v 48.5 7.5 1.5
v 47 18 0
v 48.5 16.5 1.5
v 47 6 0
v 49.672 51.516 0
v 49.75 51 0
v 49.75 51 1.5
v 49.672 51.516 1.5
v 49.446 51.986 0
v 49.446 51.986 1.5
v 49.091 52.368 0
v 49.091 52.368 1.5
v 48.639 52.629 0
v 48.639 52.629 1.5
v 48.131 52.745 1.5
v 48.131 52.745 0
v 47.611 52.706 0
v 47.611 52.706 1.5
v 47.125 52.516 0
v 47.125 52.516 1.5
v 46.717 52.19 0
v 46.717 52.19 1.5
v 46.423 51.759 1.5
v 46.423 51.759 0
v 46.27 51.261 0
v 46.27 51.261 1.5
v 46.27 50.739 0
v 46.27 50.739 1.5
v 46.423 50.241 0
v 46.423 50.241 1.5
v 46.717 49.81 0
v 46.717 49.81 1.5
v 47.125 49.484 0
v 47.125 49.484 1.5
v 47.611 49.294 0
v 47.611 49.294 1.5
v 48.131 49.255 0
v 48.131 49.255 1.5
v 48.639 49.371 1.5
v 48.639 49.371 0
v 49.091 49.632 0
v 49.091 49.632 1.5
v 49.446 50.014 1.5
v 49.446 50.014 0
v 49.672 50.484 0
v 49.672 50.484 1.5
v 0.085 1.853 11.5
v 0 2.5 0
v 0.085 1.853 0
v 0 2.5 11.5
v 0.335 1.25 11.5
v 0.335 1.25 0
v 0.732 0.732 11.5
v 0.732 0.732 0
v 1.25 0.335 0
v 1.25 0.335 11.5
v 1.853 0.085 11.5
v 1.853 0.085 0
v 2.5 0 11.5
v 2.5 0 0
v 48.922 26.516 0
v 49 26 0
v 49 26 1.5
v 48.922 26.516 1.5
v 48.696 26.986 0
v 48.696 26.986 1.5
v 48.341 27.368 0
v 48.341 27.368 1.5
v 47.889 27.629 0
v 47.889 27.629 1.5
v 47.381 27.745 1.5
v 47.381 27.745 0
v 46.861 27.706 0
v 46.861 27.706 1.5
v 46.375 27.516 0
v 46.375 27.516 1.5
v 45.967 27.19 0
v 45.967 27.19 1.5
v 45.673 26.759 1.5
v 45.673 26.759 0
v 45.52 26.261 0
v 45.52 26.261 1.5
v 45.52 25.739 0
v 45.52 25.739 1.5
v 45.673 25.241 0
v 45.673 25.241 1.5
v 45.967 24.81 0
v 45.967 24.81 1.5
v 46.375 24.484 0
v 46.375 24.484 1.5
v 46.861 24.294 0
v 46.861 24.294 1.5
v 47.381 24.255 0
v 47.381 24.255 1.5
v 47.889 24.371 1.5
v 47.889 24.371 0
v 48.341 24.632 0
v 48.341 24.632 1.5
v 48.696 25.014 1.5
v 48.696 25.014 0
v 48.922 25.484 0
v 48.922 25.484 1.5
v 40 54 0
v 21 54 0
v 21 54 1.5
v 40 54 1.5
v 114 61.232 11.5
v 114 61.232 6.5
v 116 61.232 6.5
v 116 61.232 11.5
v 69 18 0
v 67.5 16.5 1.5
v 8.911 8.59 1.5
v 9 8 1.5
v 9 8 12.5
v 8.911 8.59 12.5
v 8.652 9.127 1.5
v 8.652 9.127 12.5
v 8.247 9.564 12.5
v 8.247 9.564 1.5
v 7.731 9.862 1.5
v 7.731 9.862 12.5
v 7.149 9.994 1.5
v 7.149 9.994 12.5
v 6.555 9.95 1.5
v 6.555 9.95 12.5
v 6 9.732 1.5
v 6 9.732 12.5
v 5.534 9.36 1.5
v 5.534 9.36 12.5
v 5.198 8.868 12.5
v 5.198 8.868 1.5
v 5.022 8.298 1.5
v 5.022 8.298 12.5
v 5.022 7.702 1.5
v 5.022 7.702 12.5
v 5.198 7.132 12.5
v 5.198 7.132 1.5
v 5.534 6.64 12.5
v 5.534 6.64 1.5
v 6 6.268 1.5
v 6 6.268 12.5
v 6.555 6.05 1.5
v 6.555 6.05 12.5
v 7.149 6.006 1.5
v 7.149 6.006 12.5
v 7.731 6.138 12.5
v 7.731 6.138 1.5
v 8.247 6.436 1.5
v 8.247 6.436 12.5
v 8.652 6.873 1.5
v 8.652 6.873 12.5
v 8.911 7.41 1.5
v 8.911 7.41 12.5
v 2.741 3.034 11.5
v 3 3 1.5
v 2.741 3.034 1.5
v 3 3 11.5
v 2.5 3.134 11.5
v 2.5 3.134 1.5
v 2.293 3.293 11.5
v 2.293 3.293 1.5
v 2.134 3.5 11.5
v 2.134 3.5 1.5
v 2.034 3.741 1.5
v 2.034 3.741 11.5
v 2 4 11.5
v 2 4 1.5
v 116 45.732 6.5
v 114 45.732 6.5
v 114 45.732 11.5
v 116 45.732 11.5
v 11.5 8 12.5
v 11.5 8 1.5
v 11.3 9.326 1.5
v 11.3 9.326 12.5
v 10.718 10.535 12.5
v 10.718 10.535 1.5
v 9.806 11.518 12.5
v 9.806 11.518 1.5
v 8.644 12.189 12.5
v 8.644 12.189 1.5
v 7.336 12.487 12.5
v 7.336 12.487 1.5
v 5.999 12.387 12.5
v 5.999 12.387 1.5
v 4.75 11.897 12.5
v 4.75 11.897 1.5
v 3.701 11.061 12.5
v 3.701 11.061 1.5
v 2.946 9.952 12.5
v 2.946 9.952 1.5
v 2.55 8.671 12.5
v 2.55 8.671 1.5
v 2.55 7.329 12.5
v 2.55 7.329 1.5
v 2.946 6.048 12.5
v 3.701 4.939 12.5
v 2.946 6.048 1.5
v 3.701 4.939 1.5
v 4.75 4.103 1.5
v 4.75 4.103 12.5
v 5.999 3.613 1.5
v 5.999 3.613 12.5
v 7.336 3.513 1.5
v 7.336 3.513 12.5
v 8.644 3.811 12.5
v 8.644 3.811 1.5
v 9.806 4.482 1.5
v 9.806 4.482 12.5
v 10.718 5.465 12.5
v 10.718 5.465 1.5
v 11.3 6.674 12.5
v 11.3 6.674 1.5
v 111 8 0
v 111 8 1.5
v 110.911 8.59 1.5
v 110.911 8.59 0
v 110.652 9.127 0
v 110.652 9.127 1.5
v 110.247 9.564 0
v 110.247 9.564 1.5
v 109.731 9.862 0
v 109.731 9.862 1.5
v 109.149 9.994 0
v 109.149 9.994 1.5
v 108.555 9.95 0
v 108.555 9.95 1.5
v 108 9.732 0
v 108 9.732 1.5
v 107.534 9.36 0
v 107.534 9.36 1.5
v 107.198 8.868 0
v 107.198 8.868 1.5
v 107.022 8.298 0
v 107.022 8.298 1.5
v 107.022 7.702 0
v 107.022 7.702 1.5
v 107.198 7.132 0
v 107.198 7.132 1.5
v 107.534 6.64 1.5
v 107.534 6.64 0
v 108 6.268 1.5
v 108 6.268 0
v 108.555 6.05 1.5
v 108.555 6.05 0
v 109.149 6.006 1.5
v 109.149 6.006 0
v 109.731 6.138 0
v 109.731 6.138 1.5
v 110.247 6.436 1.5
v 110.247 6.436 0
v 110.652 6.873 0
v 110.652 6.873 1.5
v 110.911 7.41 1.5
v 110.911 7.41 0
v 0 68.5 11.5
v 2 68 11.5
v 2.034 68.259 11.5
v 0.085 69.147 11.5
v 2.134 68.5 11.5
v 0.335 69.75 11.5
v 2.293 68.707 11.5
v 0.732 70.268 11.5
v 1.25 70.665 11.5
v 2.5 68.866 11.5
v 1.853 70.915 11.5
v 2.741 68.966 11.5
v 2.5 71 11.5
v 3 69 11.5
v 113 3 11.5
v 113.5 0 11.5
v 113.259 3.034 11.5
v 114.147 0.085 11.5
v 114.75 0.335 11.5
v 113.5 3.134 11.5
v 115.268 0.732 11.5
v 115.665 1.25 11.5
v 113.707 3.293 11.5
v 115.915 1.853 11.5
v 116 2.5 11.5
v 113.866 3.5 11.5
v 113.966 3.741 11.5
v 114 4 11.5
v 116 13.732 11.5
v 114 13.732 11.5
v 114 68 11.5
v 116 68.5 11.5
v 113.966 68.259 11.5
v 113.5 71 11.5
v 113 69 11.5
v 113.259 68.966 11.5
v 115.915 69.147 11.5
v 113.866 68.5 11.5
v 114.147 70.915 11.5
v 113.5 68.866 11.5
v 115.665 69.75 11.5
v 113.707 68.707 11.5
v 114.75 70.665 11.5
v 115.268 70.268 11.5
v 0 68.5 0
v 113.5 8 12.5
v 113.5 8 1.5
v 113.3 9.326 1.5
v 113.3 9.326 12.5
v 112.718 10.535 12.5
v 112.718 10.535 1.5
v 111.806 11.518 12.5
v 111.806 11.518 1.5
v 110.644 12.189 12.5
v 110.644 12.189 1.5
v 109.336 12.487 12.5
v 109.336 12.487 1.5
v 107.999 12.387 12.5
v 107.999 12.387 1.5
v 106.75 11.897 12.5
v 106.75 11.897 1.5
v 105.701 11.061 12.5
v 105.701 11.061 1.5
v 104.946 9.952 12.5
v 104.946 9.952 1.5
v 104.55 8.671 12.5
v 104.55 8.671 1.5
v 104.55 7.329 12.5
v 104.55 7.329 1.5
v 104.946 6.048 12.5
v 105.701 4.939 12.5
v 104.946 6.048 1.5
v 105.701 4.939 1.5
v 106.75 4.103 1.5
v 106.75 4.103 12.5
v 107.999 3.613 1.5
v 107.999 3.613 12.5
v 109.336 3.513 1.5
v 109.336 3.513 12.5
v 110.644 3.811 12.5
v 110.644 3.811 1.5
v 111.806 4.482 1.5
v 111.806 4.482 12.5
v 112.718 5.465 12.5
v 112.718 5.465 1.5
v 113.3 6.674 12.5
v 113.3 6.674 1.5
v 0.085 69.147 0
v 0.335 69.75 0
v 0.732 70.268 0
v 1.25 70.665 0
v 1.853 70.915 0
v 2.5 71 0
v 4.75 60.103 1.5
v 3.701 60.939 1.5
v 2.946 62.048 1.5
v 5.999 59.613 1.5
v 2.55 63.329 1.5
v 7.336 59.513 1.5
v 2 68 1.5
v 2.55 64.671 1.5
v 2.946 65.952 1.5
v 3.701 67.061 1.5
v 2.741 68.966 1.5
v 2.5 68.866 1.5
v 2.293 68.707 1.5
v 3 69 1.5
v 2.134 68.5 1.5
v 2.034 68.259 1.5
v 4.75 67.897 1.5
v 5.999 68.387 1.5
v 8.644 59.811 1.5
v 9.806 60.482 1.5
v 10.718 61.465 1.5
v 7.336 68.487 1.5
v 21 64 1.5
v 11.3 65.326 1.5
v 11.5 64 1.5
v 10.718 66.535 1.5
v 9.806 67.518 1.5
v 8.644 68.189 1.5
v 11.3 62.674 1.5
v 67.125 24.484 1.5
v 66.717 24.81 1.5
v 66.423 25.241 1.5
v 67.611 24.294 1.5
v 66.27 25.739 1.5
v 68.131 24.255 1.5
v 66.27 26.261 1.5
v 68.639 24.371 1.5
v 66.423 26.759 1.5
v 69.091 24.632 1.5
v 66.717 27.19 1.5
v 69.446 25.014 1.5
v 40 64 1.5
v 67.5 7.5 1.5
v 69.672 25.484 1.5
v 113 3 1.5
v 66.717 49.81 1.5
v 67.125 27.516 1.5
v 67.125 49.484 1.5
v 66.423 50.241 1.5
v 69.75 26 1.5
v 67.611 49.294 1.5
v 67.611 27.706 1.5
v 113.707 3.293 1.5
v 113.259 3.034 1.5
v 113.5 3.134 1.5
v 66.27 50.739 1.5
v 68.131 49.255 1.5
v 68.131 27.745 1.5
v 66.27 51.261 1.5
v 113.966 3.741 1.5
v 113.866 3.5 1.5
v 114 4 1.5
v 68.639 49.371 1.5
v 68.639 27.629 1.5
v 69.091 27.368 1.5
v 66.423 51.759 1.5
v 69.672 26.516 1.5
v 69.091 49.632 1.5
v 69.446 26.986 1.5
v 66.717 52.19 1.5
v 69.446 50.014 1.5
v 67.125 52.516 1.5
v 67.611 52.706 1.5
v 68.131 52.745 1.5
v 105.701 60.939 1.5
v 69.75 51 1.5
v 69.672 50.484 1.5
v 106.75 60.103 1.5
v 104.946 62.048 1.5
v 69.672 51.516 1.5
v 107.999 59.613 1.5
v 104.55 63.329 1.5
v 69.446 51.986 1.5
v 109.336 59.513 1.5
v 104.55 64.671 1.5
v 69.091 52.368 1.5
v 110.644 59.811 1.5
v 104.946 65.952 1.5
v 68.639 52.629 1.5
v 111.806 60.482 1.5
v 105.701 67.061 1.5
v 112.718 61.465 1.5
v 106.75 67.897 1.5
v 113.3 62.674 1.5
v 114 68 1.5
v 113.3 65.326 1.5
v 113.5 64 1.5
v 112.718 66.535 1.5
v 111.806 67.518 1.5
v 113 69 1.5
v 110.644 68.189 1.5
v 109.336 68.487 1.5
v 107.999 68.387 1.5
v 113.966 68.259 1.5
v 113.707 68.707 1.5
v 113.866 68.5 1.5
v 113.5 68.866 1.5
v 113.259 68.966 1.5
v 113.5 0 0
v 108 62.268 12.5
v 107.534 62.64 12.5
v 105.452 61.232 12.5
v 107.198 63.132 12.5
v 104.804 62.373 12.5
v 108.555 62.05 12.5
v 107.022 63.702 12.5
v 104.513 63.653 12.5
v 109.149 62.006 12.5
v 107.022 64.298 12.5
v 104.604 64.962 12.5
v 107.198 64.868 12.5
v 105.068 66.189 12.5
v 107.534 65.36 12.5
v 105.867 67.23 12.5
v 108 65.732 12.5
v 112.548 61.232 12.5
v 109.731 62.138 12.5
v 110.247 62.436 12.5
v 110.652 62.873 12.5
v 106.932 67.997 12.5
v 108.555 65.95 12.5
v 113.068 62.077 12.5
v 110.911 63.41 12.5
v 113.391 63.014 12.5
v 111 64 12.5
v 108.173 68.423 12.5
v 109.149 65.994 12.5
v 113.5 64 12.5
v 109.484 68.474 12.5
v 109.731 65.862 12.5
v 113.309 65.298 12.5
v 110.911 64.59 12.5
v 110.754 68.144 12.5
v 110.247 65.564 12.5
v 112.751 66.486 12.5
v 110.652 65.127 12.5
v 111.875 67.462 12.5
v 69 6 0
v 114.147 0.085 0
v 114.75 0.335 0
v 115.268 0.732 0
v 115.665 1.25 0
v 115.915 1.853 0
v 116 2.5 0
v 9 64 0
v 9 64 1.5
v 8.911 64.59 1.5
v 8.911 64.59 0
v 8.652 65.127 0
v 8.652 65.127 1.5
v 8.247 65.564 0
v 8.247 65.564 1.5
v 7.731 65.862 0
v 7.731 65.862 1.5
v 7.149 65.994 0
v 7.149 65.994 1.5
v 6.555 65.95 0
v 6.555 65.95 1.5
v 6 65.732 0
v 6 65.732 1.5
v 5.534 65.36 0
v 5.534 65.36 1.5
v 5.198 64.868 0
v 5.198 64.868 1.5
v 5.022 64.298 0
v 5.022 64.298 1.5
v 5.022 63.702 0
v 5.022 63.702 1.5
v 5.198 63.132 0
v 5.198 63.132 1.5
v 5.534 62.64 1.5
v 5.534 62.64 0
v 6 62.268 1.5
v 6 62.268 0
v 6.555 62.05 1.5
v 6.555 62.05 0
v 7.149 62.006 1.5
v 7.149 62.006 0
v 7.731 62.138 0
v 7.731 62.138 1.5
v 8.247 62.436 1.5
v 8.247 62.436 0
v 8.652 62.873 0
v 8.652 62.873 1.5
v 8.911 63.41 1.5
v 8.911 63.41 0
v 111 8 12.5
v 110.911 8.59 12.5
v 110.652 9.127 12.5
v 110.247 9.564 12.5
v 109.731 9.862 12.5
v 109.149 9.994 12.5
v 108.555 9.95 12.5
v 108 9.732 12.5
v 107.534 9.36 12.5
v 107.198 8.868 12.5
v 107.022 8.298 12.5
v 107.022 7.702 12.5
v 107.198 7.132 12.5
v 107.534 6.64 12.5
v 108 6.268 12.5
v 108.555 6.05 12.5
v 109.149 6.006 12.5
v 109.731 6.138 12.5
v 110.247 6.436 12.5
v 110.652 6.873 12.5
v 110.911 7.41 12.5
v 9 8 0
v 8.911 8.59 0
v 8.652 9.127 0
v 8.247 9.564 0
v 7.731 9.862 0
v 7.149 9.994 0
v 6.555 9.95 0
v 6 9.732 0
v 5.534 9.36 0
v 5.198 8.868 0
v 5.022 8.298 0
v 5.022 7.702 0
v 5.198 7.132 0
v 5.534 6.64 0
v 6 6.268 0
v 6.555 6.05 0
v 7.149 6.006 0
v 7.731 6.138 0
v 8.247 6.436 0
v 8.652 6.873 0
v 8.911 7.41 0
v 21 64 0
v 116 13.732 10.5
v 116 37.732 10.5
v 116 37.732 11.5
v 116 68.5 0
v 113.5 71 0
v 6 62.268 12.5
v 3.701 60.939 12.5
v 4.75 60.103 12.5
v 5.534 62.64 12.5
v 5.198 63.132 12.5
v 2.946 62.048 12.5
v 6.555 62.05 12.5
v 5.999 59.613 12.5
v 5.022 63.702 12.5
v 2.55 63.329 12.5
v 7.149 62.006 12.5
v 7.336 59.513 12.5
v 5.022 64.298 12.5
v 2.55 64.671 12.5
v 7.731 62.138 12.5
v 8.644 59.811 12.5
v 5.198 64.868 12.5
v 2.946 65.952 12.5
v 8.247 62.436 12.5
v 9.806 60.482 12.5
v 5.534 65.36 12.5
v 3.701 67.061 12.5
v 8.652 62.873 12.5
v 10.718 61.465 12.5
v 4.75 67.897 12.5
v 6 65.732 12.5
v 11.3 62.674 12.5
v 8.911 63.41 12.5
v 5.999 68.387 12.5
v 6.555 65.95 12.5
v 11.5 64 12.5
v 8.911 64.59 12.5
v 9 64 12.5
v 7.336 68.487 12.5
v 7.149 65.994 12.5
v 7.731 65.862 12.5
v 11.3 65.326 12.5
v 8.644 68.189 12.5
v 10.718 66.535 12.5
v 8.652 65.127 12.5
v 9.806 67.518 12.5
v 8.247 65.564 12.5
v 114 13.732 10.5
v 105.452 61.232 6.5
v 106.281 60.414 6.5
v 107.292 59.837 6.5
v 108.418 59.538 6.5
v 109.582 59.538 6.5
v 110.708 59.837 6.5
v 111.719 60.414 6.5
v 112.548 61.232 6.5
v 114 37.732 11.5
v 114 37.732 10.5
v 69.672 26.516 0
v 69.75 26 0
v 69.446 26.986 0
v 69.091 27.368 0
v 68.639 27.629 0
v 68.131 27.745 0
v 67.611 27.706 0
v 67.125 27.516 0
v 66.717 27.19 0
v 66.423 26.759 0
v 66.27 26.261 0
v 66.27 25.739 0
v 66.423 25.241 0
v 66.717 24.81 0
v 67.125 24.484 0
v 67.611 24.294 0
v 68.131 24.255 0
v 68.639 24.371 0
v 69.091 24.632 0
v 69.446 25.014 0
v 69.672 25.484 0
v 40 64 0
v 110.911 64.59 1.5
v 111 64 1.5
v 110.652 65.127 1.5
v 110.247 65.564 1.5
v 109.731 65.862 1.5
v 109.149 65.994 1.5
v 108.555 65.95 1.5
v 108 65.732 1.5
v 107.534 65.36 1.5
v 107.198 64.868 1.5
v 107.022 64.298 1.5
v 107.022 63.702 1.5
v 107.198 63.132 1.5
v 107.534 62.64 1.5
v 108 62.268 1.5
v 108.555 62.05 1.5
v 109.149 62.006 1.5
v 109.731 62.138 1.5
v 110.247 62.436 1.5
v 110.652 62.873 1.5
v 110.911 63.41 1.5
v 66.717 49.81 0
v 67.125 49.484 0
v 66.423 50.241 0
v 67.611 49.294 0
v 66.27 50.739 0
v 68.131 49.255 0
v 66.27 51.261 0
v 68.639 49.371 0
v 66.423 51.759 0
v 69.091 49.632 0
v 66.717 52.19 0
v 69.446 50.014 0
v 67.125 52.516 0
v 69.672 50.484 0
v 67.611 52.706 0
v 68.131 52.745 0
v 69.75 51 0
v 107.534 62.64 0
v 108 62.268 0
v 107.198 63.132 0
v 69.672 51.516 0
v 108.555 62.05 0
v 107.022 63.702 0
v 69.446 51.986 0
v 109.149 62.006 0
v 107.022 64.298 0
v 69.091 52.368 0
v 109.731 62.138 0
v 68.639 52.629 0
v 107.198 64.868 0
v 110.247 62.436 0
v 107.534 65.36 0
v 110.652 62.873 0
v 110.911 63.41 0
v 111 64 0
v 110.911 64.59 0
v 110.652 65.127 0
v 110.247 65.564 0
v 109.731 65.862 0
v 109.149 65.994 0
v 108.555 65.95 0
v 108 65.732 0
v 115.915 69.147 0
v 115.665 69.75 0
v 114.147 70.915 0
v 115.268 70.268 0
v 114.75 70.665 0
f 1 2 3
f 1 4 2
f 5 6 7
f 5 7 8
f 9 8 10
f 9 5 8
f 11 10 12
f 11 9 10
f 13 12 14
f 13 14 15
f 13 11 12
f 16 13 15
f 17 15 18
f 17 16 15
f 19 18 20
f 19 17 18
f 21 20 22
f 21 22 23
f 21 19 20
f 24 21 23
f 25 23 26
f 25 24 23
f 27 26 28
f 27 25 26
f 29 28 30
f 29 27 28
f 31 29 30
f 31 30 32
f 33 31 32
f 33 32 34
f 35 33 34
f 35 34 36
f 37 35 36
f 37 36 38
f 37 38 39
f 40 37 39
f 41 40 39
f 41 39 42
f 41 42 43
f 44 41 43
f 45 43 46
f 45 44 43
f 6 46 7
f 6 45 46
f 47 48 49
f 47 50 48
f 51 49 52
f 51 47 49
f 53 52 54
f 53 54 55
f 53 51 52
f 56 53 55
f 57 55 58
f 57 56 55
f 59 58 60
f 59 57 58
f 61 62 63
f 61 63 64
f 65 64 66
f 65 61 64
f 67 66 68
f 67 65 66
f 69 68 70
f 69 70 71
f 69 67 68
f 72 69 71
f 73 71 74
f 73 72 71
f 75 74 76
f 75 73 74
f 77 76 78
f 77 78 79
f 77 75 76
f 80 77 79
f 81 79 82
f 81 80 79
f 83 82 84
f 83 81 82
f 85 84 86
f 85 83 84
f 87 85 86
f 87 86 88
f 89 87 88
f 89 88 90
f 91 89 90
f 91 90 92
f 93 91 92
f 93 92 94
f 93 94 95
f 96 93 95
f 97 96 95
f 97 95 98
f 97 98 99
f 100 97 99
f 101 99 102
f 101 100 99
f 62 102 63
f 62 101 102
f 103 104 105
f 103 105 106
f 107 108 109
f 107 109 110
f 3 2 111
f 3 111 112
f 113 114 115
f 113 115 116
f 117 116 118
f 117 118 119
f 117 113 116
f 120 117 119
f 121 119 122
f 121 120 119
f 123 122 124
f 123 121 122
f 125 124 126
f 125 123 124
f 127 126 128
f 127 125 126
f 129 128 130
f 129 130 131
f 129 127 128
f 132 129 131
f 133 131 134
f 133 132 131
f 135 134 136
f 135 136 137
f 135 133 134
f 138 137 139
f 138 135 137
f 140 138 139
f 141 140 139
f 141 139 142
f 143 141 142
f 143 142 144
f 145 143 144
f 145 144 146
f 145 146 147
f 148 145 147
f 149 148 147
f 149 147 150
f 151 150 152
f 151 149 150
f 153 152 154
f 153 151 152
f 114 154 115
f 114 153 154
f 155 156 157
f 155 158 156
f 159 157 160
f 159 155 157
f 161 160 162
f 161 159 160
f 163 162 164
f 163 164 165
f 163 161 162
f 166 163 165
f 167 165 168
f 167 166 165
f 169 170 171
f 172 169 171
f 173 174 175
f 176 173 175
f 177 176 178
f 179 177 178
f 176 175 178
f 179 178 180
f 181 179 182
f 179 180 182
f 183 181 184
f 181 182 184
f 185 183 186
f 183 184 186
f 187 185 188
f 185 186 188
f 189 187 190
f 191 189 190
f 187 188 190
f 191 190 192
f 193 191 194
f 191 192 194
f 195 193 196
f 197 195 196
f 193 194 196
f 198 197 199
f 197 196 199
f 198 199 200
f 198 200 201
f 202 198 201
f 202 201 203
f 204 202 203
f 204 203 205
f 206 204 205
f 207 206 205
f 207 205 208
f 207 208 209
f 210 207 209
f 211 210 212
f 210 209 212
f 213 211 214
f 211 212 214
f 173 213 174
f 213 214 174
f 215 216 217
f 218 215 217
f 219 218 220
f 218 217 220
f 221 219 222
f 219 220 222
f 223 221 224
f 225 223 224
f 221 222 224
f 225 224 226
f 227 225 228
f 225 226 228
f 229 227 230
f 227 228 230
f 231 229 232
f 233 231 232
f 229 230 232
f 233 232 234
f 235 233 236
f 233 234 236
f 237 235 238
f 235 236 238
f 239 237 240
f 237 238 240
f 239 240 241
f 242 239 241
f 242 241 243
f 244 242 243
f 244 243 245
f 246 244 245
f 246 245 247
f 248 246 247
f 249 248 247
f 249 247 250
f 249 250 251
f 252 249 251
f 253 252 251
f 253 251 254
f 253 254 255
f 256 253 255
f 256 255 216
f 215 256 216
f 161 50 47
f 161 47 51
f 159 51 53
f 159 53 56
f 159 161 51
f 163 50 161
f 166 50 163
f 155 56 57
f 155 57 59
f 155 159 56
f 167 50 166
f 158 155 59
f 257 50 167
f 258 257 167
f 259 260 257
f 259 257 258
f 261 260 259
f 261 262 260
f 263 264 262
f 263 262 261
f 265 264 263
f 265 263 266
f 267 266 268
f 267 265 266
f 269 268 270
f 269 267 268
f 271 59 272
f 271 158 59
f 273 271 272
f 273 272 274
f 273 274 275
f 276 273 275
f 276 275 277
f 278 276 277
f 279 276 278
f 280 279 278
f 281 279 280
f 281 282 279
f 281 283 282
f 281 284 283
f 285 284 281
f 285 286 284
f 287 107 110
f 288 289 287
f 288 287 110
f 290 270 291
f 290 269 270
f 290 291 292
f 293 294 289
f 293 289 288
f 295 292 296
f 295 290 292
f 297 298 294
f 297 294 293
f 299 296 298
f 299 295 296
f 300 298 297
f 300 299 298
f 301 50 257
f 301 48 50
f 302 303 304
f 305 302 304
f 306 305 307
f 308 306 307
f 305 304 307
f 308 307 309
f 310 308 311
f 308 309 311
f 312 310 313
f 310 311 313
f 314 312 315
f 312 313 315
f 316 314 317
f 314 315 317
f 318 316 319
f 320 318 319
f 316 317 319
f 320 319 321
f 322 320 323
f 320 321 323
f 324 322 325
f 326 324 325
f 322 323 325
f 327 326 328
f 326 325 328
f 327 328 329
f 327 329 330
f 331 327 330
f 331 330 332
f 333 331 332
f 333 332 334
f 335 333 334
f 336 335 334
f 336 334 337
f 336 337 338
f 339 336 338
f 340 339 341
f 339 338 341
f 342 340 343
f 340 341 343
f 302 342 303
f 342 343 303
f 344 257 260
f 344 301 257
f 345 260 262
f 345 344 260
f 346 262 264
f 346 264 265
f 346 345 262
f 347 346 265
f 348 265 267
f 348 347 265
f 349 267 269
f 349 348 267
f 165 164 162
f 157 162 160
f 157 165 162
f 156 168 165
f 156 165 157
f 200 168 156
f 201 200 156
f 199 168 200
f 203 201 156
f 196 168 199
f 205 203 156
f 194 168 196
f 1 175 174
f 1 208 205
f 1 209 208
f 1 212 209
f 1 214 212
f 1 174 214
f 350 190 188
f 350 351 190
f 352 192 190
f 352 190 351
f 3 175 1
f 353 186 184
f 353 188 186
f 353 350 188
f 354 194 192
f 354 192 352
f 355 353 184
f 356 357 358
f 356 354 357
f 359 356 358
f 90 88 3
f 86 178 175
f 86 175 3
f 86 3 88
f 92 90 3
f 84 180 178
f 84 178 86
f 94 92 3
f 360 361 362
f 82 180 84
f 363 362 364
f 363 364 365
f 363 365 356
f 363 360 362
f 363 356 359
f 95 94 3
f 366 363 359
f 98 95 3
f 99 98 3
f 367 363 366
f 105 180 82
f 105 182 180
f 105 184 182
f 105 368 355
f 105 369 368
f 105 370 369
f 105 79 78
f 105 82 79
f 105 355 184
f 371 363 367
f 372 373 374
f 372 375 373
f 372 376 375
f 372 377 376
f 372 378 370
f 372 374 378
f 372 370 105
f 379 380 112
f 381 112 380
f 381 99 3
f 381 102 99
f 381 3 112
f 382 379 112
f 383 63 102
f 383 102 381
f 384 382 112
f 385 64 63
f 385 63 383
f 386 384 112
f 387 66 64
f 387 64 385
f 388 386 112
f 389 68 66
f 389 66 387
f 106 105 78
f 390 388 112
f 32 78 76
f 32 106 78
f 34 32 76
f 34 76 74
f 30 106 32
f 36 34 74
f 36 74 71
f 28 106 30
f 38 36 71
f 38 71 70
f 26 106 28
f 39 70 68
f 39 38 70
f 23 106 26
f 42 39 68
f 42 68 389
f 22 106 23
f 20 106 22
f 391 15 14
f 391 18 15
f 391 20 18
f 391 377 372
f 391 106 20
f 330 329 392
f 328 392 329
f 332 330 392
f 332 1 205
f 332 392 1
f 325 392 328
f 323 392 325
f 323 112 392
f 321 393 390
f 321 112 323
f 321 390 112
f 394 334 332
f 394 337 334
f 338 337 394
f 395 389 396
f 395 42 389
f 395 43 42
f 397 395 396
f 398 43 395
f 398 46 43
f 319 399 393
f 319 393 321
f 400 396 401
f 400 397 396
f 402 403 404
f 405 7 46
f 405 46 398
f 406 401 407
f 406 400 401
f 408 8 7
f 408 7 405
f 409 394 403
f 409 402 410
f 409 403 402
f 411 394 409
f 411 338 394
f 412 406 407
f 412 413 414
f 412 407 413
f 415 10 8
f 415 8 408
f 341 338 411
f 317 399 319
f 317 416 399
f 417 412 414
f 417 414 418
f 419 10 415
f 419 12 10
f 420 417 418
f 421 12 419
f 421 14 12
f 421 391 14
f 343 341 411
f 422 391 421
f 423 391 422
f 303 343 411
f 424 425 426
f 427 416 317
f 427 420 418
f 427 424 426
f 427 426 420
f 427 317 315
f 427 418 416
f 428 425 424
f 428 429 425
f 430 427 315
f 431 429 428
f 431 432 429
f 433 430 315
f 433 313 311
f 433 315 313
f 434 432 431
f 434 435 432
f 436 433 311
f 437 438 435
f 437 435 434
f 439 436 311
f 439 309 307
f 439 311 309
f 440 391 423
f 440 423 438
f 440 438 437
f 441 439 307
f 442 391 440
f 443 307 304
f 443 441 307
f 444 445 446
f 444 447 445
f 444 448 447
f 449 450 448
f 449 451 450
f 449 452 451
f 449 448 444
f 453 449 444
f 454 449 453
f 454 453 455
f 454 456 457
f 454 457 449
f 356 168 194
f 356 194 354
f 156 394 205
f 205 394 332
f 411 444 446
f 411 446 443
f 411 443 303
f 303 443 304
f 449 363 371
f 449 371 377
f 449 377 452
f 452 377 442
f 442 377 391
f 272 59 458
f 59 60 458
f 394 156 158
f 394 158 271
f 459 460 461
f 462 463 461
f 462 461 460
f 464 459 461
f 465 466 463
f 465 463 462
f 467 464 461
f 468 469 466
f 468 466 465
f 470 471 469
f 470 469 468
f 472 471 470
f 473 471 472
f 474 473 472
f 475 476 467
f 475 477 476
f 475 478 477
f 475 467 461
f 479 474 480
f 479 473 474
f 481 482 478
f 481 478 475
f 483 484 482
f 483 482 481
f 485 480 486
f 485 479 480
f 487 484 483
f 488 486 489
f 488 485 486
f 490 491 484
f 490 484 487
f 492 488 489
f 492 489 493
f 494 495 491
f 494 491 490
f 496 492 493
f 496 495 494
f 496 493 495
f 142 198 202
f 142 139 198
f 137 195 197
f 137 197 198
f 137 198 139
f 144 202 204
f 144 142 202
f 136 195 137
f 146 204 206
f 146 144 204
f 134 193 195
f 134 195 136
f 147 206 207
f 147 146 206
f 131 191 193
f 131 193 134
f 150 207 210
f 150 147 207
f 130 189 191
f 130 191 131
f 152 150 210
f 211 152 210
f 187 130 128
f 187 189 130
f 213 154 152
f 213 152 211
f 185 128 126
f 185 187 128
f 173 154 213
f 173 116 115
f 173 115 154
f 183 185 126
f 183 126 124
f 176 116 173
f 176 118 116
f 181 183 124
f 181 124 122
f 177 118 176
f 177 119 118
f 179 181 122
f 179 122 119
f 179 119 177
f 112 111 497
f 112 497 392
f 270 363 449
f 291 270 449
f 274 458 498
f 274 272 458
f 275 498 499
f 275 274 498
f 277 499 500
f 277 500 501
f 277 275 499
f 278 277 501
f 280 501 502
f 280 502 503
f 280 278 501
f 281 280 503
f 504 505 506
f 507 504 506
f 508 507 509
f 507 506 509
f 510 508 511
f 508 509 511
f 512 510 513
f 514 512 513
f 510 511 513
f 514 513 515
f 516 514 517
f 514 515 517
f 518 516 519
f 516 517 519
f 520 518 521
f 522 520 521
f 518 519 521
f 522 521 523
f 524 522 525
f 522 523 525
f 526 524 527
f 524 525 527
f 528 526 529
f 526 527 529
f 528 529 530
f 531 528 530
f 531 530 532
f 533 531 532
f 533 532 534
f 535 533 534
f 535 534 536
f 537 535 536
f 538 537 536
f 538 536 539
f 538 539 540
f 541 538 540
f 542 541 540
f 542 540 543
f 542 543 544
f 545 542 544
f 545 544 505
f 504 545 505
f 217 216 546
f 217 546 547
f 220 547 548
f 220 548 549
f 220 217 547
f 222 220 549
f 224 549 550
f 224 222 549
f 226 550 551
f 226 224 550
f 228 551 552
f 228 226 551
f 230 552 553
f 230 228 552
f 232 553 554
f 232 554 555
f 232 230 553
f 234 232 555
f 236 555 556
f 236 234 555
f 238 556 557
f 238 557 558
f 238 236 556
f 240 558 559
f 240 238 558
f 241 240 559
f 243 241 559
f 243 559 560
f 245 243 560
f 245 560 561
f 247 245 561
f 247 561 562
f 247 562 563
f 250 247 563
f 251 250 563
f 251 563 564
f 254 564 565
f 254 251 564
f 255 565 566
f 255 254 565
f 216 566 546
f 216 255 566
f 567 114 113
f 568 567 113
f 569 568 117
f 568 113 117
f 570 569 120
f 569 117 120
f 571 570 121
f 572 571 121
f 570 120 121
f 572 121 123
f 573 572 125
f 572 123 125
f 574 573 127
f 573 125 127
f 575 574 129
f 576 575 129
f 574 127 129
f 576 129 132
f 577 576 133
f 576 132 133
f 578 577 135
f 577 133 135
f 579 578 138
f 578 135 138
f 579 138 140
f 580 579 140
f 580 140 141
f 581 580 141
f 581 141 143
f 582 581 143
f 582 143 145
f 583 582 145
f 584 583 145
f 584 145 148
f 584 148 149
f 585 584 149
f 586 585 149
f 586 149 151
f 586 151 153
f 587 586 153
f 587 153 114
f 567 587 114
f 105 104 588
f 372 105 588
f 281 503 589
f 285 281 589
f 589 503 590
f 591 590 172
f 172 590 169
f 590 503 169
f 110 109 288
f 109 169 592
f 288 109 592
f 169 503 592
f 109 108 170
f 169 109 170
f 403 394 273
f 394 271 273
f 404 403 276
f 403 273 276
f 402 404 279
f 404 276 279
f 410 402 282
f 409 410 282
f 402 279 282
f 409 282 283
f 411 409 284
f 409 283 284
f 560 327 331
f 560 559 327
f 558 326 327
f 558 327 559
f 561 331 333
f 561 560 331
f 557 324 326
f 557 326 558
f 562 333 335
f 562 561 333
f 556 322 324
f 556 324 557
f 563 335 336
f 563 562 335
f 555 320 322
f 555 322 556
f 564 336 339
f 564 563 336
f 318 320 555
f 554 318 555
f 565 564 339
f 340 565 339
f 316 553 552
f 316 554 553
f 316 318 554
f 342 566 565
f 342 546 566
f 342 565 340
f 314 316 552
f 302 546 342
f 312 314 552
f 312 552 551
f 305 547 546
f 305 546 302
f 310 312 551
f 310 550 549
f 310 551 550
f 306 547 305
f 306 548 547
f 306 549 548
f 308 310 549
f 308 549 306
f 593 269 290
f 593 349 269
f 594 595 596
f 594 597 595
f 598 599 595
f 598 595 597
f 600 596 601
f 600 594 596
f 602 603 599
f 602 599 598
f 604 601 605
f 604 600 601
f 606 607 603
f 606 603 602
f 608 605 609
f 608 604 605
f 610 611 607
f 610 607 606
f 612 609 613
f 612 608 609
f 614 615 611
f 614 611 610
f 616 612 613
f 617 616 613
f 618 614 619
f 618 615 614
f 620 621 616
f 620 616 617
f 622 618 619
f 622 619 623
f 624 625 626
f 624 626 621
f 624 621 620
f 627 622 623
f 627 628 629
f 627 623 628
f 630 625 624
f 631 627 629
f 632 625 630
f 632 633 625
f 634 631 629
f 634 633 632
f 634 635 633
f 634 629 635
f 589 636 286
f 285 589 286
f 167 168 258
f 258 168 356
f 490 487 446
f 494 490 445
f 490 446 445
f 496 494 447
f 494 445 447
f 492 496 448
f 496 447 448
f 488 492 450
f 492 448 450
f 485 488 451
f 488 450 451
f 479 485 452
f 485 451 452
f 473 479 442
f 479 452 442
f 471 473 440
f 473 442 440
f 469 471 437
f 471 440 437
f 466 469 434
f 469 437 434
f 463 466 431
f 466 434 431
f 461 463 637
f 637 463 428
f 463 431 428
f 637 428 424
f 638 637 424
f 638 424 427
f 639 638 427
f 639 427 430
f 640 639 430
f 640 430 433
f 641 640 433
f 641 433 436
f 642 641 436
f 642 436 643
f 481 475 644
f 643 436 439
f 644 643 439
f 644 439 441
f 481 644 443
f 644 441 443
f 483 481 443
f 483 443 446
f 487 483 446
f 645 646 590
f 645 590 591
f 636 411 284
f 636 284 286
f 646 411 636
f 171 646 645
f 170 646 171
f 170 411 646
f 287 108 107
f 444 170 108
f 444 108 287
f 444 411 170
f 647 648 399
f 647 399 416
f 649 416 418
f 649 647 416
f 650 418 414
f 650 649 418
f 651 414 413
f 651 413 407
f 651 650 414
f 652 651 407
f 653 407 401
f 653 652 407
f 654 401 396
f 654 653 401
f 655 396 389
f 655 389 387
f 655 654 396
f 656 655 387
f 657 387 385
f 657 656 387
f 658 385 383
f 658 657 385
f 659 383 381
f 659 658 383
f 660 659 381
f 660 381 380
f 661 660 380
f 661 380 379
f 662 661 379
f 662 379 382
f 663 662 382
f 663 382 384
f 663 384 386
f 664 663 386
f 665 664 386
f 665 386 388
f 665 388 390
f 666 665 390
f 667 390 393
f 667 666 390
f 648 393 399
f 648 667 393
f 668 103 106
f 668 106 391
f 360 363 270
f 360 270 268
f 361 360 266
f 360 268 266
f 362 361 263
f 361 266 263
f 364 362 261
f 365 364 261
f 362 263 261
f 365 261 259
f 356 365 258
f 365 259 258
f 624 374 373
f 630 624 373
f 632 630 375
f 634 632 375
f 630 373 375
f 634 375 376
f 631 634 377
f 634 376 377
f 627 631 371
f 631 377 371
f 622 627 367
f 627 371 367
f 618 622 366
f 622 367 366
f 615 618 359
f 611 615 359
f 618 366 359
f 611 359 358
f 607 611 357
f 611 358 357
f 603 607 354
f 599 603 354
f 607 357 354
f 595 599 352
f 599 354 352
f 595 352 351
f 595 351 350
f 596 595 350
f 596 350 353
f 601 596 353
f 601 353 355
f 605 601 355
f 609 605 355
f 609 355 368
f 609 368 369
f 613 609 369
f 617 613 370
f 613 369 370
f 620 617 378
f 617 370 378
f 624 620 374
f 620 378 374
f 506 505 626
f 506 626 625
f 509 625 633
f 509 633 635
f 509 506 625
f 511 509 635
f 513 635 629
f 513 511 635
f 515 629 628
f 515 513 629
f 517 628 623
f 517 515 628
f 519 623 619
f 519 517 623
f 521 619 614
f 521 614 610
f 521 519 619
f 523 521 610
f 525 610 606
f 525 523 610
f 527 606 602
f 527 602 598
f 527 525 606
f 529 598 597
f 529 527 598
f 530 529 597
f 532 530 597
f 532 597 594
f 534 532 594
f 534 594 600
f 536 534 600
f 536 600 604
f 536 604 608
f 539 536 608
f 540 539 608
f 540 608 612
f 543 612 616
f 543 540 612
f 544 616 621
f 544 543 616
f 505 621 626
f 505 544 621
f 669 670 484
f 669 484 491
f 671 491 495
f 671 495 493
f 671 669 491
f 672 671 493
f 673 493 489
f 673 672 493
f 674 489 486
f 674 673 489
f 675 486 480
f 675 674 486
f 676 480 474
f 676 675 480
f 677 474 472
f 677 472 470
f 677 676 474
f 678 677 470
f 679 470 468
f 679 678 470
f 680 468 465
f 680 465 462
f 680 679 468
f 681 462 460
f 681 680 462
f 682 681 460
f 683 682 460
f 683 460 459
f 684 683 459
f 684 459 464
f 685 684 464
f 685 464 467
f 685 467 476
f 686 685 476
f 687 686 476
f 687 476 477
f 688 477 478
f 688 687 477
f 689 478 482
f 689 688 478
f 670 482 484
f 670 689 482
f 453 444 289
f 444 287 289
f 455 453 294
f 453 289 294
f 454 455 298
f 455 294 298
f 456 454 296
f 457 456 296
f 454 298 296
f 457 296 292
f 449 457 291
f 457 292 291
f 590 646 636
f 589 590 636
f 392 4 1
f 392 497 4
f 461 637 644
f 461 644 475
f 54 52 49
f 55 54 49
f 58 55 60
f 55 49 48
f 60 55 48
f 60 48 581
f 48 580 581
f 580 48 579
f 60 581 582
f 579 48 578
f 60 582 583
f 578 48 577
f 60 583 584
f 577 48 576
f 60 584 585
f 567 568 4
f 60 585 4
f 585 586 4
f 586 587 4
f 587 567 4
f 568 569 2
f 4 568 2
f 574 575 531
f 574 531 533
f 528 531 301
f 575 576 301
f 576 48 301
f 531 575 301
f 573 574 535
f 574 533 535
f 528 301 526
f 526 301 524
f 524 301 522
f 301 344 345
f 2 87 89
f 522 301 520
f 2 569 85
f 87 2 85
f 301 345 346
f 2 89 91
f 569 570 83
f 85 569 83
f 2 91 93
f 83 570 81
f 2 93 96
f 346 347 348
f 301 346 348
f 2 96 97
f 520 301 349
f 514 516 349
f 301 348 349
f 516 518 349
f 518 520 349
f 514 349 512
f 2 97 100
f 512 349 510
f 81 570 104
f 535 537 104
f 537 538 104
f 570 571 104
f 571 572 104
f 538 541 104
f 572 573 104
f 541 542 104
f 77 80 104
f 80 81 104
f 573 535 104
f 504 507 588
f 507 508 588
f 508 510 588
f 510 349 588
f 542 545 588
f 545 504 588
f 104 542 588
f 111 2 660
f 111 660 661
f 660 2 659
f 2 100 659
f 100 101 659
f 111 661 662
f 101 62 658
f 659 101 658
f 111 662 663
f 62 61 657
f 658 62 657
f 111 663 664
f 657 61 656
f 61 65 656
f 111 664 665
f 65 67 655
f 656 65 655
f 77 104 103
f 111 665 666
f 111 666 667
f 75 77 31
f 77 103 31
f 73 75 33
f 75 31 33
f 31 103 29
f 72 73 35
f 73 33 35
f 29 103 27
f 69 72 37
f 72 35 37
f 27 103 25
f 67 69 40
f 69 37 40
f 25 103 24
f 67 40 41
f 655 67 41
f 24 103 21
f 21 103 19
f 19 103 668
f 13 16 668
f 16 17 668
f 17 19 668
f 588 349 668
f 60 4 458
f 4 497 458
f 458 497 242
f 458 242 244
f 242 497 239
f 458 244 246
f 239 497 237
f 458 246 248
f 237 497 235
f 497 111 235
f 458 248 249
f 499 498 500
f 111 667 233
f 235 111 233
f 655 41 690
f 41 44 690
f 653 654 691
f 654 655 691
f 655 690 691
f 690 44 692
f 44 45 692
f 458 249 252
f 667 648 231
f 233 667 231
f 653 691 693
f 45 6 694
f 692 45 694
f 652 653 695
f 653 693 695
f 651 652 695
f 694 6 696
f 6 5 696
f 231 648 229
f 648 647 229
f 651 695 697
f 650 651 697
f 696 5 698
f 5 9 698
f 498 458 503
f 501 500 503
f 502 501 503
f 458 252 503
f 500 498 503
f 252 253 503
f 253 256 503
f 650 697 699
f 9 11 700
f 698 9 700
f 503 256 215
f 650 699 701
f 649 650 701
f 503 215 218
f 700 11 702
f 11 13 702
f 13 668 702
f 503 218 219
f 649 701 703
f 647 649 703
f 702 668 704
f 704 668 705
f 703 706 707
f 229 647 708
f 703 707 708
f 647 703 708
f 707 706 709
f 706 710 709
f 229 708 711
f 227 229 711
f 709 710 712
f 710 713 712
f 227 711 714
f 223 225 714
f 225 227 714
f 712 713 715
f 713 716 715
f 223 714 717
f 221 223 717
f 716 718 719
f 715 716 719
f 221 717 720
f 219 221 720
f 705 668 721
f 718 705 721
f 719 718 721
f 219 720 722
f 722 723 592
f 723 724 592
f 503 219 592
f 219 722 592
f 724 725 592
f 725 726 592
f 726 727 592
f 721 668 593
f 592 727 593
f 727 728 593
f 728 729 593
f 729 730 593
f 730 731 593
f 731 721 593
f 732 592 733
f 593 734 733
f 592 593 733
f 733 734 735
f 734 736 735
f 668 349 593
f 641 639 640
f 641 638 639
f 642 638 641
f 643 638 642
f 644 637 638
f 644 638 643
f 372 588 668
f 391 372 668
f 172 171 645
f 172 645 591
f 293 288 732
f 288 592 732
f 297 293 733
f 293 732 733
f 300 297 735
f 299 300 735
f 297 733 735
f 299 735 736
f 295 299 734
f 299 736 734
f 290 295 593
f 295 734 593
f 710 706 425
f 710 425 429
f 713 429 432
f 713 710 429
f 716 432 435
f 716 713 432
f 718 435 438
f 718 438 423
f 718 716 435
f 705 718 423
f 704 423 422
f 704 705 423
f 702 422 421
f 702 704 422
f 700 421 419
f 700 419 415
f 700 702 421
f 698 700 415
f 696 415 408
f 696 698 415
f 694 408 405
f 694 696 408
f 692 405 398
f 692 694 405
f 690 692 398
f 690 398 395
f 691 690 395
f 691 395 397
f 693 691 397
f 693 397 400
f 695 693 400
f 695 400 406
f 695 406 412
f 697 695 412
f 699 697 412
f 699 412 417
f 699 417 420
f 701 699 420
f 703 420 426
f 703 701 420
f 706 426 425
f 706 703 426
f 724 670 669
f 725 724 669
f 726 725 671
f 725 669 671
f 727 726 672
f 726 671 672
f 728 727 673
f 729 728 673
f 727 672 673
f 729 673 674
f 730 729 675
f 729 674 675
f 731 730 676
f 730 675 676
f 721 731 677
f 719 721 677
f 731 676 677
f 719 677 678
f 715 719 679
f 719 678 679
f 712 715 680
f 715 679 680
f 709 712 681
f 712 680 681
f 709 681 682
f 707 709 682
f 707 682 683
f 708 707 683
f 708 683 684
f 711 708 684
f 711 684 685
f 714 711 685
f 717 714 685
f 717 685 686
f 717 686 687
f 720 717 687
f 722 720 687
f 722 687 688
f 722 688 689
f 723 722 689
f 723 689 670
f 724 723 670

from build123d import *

# Parameters (mm, degrees)
F0_W         = 116
F0_H         = 71
F0_R         = 1.75
F0_W_2       = 18
F0_H_2       = 8
F0_W_3       = 19
F0_H_3       = 10
F1_DEPTH     = 1.5
F2_W         = 116
F2_H         = 71
F2_W_2       = 112
F2_H_2       = 66
F3_DEPTH     = 10
F4_R         = 2.5
F5_R         = 1
F6_R         = 4.5
F6_R_2       = 2
F7_DEPTH     = 11
F8_T1_DEPTH  = 8
F8_T3_DEPTH  = 18
F8_T9_DEPTH  = 23.1433659759
F8_T13_DEPTH = 13.1433659759
F8_T20_DEPTH = 23.1433659759
F8_T24_DEPTH = 13.1433659759
F8_T31_DEPTH = 23.1433659759
F8_T35_DEPTH = 13.1433659759
F8_T42_DEPTH = 13.1433659759
F8_T46_DEPTH = 23.1433659759
F9_W         = 15.5
F9_H         = 9
F9_W_2       = 24
F9_H_2       = 5
F10_DEPTH    = 25
F11_DEPTH    = 25
F12_DEPTH    = 25


# Not quite as in the source:
# - a fillet or chamfer that OpenCascade refuses, or shapes differently, is made with other operations: its cross-section is extruded or revolved along the edge and cut away or added


with BuildPart() as f1:
    # F0 (on Top) → F1 (new body)
    with BuildSketch(Plane.XY):
        with Locations((58, 35.5)):
            Rectangle(F0_W, F0_H)
        with Locations((47.25, 26)):
            Circle(F0_R, mode=Mode.SUBTRACT)
        with Locations((58, 12)):
            Rectangle(F0_W_2, F0_H_2, mode=Mode.SUBTRACT)
        with Locations((68, 26)):
            Circle(F0_R, mode=Mode.SUBTRACT)
        with Locations((48, 51)):
            Circle(F0_R, mode=Mode.SUBTRACT)
        with Locations((30.5, 59)):
            Rectangle(F0_W_3, F0_H_3, mode=Mode.SUBTRACT)
        with Locations((68, 51)):
            Circle(F0_R, mode=Mode.SUBTRACT)
    extrude(amount=F1_DEPTH)

    # F2 (on face) → F3 (join)
    with BuildSketch(Plane.XY.offset(1.5)):
        with Locations((58, 35.5)):
            Rectangle(F2_W, F2_H)
        with Locations((58, 36)):
            Rectangle(F2_W_2, F2_H_2, mode=Mode.SUBTRACT)
    extrude(amount=F3_DEPTH)

    # F4
    f4_edges = [f1.edges().sort_by_distance(p)[0] for p in [
        (0, 0, 5.75),
        (116, 0, 5.75),
        (0, 71, 5.75),
        (116, 71, 5.75),
    ]]
    fillet(f4_edges, radius=F4_R)

    # F5
    f5_edges = [f1.edges().sort_by_distance(p)[0] for p in [
        (114, 3, 6.5),
        (2, 3, 6.5),
        (2, 69, 6.5),
        (114, 69, 6.5),
    ]]
    fillet(f5_edges, radius=F5_R)

    # F6 (on face) → F7 (join)
    with BuildSketch(Plane.XY.offset(1.5)):
        with Locations((7, 64)):
            Circle(F6_R)
        with Locations((7, 64)):
            Circle(F6_R_2, mode=Mode.SUBTRACT)
        with Locations((7, 8)):
            Circle(F6_R)
        with Locations((7, 8)):
            Circle(F6_R_2, mode=Mode.SUBTRACT)
        with Locations((109, 8)):
            Circle(F6_R)
        with Locations((109, 8)):
            Circle(F6_R_2, mode=Mode.SUBTRACT)
        with Locations((109, 64)):
            Circle(F6_R)
        with Locations((109, 64)):
            Circle(F6_R_2, mode=Mode.SUBTRACT)
    extrude(amount=F7_DEPTH)

    # F8: chamfer of 2 on 4 edges, made by hand

    # F8_s2 → F8_t1 (cut)
    with BuildSketch(Plane.XZ.offset(-16)):
        Polygon((69, 0), (67, 2), (67, 0), align=None)
        Polygon((47, 0), (49, 2), (49, 0), align=None)
    extrude(amount=F8_T1_DEPTH, mode=Mode.SUBTRACT)

    # F8_s4 → F8_t3 (cut)
    with BuildSketch(Plane.YZ.offset(49)):
        Polygon((6, 0), (8, 2), (8, 0), align=None)
        Polygon((18, 0), (16, 2), (16, 0), align=None)
    extrude(amount=F8_T3_DEPTH, mode=Mode.SUBTRACT)


with BuildPart() as f8_tool7:
    # F8_s8 → F8_t9 (new body)
    with BuildSketch(Plane.YZ.offset(49)):
        Polygon((18, 0), (16, 2), (16, 0), align=None)
    extrude(amount=F8_T9_DEPTH)

    split(bisect_by=Plane.YZ.offset(67), keep=Keep.TOP)


with BuildPart() as f8_tool11:
    # F8_s12 → F8_t13 (new body)
    with BuildSketch(Plane.XZ.offset(-21.1433659759)):
        Polygon((69, 0), (67, 2), (67, 0), align=None)
    extrude(amount=F8_T13_DEPTH)

    split(bisect_by=Plane.XZ.offset(-16), keep=Keep.BOTTOM)


with BuildPart() as f8_tool7_1:
    add(f8_tool7.part)

    # F8_t15: intersect F8_tool11
    add(f8_tool11.part, mode=Mode.INTERSECT)


with BuildPart() as f1_1:
    add(f1.part)

    # F8_t5: cut F8_tool7
    add(f8_tool7_1.part, mode=Mode.SUBTRACT)


with BuildPart() as f8_tool18:
    # F8_s19 → F8_t20 (new body)
    with BuildSketch(Plane.YZ.offset(72.1433659759)):
        Polygon((6, 0), (8, 2), (8, 0), align=None)
    extrude(amount=-F8_T20_DEPTH)

    split(bisect_by=Plane.YZ.offset(67), keep=Keep.TOP)


with BuildPart() as f8_tool22:
    # F8_s23 → F8_t24 (new body)
    with BuildSketch(Plane.XZ.offset(-16)):
        Polygon((69, 0), (67, 2), (67, 0), align=None)
    extrude(amount=F8_T24_DEPTH)

    split(bisect_by=Plane.XZ.offset(-8), keep=Keep.TOP)


with BuildPart() as f8_tool18_1:
    add(f8_tool18.part)

    # F8_t26: intersect F8_tool22
    add(f8_tool22.part, mode=Mode.INTERSECT)


with BuildPart() as f1_2:
    add(f1_1.part)

    # F8_t16: cut F8_tool18
    add(f8_tool18_1.part, mode=Mode.SUBTRACT)


with BuildPart() as f8_tool29:
    # F8_s30 → F8_t31 (new body)
    with BuildSketch(Plane.YZ.offset(67)):
        Polygon((6, 0), (8, 2), (8, 0), align=None)
    extrude(amount=-F8_T31_DEPTH)

    split(bisect_by=Plane.YZ.offset(49), keep=Keep.BOTTOM)


with BuildPart() as f8_tool33:
    # F8_s34 → F8_t35 (new body)
    with BuildSketch(Plane.XZ.offset(-2.8566340241)):
        Polygon((47, 0), (49, 2), (49, 0), align=None)
    extrude(amount=-F8_T35_DEPTH)

    split(bisect_by=Plane.XZ.offset(-8), keep=Keep.TOP)


with BuildPart() as f8_tool29_1:
    add(f8_tool29.part)

    # F8_t37: intersect F8_tool33
    add(f8_tool33.part, mode=Mode.INTERSECT)


with BuildPart() as f1_3:
    add(f1_2.part)

    # F8_t27: cut F8_tool29
    add(f8_tool29_1.part, mode=Mode.SUBTRACT)


with BuildPart() as f8_tool40:
    # F8_s41 → F8_t42 (new body)
    with BuildSketch(Plane.XZ.offset(-8)):
        Polygon((47, 0), (49, 2), (49, 0), align=None)
    extrude(amount=-F8_T42_DEPTH)

    split(bisect_by=Plane.XZ.offset(-16), keep=Keep.BOTTOM)


with BuildPart() as f8_tool44:
    # F8_s45 → F8_t46 (new body)
    with BuildSketch(Plane.YZ.offset(43.8566340241)):
        Polygon((18, 0), (16, 2), (16, 0), align=None)
    extrude(amount=F8_T46_DEPTH)

    split(bisect_by=Plane.YZ.offset(49), keep=Keep.BOTTOM)


with BuildPart() as f8_tool40_1:
    add(f8_tool40.part)

    # F8_t48: intersect F8_tool44
    add(f8_tool44.part, mode=Mode.INTERSECT)


with BuildPart() as f1_4:
    add(f1_3.part)

    # F8_t38: cut F8_tool40
    add(f8_tool40_1.part, mode=Mode.SUBTRACT)

    # F9 (on face) → F10 (cut)
    with BuildSketch(Plane(origin=(114, 0, 0), x_dir=(0, -1, 0), z_dir=(-1, 0, 0))):
        with Locations((-53.482233047, 11)):
            Rectangle(F9_W, F9_H)
        with Locations((-25.732233047, 13)):
            Rectangle(F9_W_2, F9_H_2)
    extrude(amount=-F10_DEPTH, mode=Mode.SUBTRACT)

    # F11 (cut): faces of the model
    f11_faces = [f1_4.faces().sort_by_distance(p)[0] for p in [
        (7, 8, 1.5),
        (7, 64, 1.5),
        (109, 8, 1.5),
        (109, 64, 1.5),
    ]]
    extrude(f11_faces, amount=-F11_DEPTH, mode=Mode.SUBTRACT)

    # F9 (on face) → F12 (cut)
    with BuildSketch(Plane(origin=(114, 0, 0), x_dir=(0, -1, 0), z_dir=(-1, 0, 0))):
        with Locations((-53.482233047, 11)):
            Rectangle(F9_W, F9_H)
        with Locations((-25.732233047, 13)):
            Rectangle(F9_W_2, F9_H_2)
    extrude(amount=F12_DEPTH, mode=Mode.SUBTRACT)


solid = f1_4.part
